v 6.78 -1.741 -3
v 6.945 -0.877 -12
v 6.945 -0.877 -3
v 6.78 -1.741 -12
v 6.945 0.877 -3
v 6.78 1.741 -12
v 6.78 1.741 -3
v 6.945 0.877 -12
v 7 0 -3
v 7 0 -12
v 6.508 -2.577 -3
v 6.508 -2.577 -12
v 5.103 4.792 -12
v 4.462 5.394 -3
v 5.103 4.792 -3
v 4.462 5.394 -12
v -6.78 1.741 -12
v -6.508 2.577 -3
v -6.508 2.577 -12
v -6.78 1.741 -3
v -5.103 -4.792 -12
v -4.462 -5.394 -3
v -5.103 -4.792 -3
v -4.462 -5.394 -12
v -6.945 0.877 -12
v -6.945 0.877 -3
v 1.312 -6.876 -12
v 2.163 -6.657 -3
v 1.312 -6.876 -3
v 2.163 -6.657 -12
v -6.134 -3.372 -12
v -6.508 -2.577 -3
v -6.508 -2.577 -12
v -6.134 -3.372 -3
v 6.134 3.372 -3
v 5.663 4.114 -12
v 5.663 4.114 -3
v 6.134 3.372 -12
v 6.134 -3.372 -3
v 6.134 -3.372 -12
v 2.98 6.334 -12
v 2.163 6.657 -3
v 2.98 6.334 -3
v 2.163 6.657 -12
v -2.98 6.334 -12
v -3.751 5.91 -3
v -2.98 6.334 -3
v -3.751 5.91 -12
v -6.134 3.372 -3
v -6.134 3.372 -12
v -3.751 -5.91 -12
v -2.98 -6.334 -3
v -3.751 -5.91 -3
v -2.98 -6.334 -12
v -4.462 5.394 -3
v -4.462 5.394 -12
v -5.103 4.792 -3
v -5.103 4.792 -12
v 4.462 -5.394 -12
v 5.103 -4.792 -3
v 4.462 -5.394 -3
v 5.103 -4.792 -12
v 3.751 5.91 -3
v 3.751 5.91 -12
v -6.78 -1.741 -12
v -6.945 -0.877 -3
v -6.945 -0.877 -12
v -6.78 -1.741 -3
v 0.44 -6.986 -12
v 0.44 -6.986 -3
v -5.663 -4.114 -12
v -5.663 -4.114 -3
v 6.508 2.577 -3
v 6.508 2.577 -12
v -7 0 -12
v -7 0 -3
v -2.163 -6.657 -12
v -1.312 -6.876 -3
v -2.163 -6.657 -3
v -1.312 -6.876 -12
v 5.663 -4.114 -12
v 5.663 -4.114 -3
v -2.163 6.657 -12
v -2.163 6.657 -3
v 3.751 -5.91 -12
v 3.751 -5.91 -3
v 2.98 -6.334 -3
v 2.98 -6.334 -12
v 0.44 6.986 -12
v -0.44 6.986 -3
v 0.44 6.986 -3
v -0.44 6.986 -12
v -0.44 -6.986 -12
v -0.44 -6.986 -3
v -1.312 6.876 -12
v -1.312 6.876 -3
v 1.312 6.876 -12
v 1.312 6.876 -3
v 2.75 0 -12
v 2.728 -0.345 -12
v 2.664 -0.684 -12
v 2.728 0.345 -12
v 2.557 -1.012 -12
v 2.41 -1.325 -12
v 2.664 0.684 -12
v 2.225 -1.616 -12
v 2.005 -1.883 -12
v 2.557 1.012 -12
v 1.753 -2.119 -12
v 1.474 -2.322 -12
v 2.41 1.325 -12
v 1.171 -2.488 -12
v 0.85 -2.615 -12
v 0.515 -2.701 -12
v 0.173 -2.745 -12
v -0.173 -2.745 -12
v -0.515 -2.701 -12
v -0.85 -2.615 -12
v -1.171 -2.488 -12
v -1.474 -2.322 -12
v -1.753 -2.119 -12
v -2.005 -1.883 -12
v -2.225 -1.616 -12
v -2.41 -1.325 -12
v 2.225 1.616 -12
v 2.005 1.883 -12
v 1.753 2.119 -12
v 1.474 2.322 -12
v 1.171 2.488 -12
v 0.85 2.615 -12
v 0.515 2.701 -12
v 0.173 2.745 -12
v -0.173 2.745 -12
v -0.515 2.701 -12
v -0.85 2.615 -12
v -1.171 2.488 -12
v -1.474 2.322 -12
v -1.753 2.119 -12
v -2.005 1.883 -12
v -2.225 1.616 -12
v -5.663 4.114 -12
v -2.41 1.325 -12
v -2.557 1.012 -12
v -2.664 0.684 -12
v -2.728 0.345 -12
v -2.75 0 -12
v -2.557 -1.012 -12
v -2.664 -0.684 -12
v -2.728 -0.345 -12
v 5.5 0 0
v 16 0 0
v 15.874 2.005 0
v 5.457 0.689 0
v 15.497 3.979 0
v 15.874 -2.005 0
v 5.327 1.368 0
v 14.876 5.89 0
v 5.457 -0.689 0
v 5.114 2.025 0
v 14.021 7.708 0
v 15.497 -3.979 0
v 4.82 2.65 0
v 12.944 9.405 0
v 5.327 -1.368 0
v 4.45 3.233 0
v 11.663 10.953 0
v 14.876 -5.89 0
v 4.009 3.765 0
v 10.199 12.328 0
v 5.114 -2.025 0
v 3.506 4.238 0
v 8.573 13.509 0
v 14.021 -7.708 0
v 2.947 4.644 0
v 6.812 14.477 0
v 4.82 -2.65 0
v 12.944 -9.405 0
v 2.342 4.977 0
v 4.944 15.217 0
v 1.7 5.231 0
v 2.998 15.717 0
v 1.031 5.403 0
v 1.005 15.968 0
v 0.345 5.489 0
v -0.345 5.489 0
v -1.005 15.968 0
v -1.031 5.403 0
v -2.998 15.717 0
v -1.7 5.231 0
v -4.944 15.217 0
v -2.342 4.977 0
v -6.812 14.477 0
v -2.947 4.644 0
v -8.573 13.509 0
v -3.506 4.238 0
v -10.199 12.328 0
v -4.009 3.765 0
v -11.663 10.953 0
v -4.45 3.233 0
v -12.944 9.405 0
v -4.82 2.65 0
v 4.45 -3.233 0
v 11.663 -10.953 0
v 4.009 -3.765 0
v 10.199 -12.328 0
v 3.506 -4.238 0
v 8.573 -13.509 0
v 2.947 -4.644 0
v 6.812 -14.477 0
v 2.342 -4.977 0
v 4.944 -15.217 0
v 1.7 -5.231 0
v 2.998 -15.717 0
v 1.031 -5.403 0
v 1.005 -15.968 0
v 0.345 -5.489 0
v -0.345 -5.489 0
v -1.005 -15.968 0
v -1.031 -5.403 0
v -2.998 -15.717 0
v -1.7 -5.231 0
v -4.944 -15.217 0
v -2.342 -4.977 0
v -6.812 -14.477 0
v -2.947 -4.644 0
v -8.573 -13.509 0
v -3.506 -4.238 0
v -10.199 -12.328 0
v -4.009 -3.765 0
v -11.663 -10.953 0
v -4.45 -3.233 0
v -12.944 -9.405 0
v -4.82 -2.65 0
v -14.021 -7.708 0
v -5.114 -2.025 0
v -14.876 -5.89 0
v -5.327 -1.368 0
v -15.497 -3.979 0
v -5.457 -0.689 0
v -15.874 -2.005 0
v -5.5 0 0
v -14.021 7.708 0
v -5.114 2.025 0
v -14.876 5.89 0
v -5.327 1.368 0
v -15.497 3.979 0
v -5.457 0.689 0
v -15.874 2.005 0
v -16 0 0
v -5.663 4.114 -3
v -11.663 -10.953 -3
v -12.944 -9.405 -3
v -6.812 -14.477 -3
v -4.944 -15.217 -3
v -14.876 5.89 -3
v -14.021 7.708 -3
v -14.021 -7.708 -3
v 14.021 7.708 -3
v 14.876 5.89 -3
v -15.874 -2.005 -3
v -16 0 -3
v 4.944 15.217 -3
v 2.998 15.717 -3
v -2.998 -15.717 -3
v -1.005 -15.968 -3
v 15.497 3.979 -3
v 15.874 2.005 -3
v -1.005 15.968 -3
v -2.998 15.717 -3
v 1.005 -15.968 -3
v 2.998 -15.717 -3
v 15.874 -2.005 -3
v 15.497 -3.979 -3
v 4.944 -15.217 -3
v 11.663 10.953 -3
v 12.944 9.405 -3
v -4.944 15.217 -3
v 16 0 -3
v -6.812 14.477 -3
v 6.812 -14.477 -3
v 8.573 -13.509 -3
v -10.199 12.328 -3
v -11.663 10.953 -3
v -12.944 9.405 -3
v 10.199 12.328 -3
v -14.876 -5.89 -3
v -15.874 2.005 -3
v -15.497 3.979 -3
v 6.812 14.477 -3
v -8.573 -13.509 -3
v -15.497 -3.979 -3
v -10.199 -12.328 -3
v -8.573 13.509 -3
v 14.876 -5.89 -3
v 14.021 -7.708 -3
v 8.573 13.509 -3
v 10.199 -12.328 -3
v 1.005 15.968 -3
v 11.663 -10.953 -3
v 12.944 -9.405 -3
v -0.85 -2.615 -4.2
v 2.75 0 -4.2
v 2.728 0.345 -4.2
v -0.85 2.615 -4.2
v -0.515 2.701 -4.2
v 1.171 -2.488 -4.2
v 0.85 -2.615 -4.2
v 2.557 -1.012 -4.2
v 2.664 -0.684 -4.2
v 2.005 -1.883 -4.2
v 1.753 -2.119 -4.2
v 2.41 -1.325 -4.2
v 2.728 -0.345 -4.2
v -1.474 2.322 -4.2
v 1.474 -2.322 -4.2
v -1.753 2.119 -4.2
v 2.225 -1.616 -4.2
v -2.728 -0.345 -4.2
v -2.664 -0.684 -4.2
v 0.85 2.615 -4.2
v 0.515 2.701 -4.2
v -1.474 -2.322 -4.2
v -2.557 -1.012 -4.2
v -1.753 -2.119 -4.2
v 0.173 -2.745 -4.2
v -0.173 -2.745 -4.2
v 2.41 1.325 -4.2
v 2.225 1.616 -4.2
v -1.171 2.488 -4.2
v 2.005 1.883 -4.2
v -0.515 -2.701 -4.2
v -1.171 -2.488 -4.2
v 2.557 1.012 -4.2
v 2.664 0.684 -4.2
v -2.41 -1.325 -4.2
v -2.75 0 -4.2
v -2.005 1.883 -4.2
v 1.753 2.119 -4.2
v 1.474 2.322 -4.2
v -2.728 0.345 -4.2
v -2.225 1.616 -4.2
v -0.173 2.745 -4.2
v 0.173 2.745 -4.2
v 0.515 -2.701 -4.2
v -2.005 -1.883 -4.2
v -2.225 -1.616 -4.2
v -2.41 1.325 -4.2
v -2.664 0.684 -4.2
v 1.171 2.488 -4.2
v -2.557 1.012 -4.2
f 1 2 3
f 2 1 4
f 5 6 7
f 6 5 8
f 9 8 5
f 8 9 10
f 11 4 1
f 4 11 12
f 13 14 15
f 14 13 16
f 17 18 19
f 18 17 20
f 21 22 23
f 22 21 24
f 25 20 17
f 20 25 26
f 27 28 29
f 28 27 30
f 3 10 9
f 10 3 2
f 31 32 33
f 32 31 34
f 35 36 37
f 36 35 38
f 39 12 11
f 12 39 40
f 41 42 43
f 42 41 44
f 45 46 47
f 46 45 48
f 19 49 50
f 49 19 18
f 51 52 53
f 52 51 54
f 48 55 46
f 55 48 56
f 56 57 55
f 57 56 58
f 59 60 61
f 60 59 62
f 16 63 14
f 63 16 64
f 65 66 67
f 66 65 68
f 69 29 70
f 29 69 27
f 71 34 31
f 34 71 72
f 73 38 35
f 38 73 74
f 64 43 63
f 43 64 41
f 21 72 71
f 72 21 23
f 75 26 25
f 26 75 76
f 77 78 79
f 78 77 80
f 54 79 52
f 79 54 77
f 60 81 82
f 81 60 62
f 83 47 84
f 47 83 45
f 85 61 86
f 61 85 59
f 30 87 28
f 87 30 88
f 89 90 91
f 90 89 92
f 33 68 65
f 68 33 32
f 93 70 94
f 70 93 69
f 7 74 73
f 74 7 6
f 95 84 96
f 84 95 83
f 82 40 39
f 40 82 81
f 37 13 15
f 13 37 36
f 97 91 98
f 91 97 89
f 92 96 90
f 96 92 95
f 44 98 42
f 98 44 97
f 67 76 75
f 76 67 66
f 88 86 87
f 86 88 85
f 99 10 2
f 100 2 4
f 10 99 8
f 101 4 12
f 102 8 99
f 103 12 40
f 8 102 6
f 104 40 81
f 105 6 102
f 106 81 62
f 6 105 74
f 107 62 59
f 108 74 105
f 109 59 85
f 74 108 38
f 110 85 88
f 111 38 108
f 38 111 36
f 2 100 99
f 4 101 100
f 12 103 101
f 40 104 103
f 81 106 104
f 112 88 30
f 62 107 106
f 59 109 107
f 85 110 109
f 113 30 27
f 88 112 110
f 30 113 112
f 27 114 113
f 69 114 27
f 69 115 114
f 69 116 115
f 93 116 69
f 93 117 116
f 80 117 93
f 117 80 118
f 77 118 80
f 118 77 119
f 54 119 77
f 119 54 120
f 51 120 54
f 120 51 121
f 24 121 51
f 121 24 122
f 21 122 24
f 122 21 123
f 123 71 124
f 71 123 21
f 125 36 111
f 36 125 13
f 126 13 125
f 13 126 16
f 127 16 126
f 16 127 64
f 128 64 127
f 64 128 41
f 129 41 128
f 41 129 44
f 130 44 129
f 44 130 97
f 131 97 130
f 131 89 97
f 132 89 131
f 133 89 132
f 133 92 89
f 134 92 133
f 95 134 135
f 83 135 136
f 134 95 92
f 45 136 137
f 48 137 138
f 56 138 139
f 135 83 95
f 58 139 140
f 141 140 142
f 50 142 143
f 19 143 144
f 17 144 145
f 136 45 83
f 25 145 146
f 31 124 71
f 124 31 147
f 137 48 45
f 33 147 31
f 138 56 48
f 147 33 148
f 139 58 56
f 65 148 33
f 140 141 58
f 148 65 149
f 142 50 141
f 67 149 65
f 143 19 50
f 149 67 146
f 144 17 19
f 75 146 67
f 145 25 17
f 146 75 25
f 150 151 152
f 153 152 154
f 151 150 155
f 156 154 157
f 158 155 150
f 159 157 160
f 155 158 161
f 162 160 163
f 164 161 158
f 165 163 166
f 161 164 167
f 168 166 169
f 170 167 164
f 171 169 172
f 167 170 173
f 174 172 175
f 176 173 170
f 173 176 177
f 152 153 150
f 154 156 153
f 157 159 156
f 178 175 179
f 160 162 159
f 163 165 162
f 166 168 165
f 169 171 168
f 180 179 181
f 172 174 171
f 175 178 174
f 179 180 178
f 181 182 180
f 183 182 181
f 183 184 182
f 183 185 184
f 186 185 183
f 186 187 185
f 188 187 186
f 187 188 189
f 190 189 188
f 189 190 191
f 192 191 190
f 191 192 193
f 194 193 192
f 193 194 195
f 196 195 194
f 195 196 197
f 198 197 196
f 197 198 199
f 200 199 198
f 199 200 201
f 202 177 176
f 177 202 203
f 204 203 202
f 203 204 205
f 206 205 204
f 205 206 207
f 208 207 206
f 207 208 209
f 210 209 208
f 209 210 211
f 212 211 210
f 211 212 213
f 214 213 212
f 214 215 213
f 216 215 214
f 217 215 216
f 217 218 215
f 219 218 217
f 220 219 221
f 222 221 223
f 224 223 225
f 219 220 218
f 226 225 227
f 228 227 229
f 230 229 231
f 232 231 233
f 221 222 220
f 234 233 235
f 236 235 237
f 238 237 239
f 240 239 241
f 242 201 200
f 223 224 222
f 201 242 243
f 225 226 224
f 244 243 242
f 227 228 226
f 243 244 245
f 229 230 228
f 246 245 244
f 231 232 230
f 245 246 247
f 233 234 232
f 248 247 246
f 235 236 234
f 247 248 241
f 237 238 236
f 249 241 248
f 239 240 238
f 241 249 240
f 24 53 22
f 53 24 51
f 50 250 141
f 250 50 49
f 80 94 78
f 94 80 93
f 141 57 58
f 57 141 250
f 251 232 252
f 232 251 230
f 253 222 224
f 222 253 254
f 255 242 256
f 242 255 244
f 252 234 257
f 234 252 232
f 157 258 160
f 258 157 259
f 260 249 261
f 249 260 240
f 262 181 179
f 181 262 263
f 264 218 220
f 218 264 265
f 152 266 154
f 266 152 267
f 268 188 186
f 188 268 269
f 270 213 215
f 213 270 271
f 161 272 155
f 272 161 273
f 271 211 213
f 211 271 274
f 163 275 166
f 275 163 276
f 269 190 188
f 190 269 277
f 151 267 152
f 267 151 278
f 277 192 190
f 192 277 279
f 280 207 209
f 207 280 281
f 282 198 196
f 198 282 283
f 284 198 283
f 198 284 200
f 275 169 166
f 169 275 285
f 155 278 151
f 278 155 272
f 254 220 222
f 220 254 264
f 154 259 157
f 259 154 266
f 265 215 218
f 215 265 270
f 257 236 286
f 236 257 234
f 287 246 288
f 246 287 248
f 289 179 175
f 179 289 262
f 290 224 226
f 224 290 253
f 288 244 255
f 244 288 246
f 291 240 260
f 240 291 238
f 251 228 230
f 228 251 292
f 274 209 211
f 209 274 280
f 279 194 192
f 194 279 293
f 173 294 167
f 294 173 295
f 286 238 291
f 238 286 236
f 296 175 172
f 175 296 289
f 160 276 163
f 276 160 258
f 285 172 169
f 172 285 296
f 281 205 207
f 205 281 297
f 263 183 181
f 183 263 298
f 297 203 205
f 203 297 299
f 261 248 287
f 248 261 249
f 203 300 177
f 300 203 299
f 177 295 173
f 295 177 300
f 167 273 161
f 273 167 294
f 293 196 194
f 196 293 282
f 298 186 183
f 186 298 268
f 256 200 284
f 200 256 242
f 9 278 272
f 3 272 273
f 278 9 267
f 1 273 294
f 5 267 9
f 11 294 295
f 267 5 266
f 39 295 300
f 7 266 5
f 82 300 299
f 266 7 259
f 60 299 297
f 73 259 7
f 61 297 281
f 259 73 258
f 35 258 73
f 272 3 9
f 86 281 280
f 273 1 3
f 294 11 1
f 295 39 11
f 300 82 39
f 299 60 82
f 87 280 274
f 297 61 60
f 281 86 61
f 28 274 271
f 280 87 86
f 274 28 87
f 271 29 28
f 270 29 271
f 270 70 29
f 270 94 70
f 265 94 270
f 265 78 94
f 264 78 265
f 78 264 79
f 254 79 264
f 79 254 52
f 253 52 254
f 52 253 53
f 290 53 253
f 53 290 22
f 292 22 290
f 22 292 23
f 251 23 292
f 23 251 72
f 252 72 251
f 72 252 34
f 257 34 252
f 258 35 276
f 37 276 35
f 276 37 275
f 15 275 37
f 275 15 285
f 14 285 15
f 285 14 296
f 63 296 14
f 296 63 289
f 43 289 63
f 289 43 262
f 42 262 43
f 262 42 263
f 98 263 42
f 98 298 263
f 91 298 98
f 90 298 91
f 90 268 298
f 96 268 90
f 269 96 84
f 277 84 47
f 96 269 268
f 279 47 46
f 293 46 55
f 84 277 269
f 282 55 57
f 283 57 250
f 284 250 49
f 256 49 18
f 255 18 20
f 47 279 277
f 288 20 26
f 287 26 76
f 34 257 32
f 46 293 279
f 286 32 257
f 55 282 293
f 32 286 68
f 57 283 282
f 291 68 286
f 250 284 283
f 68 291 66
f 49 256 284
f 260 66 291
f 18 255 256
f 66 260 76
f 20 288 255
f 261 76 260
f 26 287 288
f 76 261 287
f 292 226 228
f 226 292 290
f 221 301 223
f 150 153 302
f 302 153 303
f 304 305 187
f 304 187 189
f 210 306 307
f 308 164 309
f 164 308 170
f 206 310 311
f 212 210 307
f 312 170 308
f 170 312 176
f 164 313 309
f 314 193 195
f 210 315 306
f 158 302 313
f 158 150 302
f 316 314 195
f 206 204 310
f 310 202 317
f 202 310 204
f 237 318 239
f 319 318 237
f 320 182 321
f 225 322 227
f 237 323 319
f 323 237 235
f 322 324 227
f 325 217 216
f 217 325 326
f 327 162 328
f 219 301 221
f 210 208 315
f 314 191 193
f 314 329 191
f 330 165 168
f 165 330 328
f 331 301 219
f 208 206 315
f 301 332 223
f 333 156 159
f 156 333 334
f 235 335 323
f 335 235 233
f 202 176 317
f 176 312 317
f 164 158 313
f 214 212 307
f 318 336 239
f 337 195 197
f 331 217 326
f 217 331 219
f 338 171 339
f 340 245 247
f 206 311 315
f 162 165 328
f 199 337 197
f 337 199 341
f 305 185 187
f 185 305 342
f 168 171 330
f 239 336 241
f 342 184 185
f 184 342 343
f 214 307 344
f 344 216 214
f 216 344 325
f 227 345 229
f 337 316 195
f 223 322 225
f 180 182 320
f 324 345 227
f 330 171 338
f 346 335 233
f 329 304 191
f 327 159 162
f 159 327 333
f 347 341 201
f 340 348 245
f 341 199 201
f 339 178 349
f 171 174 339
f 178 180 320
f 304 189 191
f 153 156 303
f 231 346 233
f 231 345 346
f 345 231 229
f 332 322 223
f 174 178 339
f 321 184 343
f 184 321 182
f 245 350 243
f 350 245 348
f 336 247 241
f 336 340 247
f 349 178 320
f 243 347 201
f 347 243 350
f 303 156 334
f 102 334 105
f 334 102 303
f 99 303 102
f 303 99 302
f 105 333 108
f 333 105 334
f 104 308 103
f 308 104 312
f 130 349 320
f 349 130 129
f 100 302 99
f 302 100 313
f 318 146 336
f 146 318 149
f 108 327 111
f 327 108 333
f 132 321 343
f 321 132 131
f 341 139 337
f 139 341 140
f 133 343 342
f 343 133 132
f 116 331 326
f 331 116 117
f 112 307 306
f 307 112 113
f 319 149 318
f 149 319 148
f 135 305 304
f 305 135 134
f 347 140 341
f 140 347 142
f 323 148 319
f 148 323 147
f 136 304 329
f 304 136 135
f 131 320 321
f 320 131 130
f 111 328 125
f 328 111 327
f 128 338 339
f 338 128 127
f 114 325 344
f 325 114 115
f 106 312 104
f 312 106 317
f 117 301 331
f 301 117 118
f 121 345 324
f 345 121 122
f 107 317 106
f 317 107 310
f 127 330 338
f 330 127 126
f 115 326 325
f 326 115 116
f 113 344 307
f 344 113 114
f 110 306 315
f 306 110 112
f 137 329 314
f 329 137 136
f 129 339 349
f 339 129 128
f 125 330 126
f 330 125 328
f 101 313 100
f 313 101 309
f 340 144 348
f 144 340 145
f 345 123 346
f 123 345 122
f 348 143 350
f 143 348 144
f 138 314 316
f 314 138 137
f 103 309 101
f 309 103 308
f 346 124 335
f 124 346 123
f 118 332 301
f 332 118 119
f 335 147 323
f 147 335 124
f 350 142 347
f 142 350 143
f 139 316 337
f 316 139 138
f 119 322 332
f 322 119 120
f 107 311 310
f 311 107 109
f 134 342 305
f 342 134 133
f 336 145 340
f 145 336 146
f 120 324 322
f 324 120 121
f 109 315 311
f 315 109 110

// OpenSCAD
$fn = 50;


difference() {
	union() {
		translate(v = [0, 0, -12.0000000000]) {
			cylinder(h = 12, r = 7.0000000000);
		}
		translate(v = [0, 0, -3.0000000000]) {
			cylinder(h = 3, r = 16.0000000000);
		}
	}
	union() {
		translate(v = [0, 0, 0]) {
			rotate(a = [0, 0, 0]) {
				difference() {
					union() {
						#translate(v = [0, 0, -12.0000000000]) {
							cylinder(h = 12, r = 2.2500000000);
						}
						#translate(v = [0, 0, -4.2000000000]) {
							cylinder(h = 4.2000000000, r = 7.0000000000, r1 = 2.7500000000, r2 = 5.5000000000);
						}
						#translate(v = [0, 0, -12.0000000000]) {
							cylinder(h = 12, r = 2.7500000000);
						}
						#translate(v = [0, 0, -12.0000000000]) {
							cylinder(h = 12, r = 2.2500000000);
						}
					}
					union();
				}
			}
		}
	}
}
